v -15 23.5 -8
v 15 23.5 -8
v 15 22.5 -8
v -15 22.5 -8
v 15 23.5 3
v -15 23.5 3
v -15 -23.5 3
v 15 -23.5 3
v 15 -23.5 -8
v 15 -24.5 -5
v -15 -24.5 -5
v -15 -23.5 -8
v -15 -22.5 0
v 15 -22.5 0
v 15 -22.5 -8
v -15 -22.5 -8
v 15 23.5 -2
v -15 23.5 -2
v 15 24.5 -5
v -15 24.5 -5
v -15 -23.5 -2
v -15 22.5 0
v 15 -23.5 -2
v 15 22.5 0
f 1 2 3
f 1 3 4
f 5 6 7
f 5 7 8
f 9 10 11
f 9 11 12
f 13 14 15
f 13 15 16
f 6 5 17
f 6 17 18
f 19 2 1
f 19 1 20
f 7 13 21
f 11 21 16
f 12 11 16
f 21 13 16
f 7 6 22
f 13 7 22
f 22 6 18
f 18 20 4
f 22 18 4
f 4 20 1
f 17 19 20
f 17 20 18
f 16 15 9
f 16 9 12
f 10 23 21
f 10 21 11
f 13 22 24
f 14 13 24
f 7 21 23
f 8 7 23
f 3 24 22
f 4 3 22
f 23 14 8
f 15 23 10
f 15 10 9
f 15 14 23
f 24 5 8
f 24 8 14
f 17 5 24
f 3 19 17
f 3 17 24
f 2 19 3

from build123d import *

# Parameters (mm, degrees)
SKETCH_1_W      = 30
SKETCH_1_H      = 47
EXTRUDE_1_DEPTH = 3
SKETCH_2_W      = 30
SKETCH_2_H      = 1
EXTRUDE_2_DEPTH = 8
EXTRUDE_3_DEPTH = 30


with BuildPart() as part:
    # 草图1 → 凸台-拉伸1 (new body)
    with BuildSketch(Plane.XY):
        Rectangle(SKETCH_1_W, SKETCH_1_H)
    extrude(amount=EXTRUDE_1_DEPTH)

    # 草图2 → 凸台-拉伸2 (add)
    with BuildSketch(Plane(origin=(0, 0, 0), x_dir=(-1, 0, 0), z_dir=(0, 0, -1))):
        with Locations((0, 23)):
            Rectangle(SKETCH_2_W, SKETCH_2_H)
        with Locations((0, -23)):
            Rectangle(SKETCH_2_W, SKETCH_2_H)
    extrude(amount=EXTRUDE_2_DEPTH)

    # 草图3 → 凸台-拉伸3 (add, through all)
    with BuildSketch(Plane(origin=(15, 0, 0), x_dir=(0, 0, -1), z_dir=(1, 0, 0))):
        Polygon((2, 23.5), (8, 23.5), (5, 24.5), align=None)
        Polygon((8, -23.5), (2, -23.5), (5, -24.5), align=None)
    extrude(amount=-EXTRUDE_3_DEPTH)


solid = part.part
